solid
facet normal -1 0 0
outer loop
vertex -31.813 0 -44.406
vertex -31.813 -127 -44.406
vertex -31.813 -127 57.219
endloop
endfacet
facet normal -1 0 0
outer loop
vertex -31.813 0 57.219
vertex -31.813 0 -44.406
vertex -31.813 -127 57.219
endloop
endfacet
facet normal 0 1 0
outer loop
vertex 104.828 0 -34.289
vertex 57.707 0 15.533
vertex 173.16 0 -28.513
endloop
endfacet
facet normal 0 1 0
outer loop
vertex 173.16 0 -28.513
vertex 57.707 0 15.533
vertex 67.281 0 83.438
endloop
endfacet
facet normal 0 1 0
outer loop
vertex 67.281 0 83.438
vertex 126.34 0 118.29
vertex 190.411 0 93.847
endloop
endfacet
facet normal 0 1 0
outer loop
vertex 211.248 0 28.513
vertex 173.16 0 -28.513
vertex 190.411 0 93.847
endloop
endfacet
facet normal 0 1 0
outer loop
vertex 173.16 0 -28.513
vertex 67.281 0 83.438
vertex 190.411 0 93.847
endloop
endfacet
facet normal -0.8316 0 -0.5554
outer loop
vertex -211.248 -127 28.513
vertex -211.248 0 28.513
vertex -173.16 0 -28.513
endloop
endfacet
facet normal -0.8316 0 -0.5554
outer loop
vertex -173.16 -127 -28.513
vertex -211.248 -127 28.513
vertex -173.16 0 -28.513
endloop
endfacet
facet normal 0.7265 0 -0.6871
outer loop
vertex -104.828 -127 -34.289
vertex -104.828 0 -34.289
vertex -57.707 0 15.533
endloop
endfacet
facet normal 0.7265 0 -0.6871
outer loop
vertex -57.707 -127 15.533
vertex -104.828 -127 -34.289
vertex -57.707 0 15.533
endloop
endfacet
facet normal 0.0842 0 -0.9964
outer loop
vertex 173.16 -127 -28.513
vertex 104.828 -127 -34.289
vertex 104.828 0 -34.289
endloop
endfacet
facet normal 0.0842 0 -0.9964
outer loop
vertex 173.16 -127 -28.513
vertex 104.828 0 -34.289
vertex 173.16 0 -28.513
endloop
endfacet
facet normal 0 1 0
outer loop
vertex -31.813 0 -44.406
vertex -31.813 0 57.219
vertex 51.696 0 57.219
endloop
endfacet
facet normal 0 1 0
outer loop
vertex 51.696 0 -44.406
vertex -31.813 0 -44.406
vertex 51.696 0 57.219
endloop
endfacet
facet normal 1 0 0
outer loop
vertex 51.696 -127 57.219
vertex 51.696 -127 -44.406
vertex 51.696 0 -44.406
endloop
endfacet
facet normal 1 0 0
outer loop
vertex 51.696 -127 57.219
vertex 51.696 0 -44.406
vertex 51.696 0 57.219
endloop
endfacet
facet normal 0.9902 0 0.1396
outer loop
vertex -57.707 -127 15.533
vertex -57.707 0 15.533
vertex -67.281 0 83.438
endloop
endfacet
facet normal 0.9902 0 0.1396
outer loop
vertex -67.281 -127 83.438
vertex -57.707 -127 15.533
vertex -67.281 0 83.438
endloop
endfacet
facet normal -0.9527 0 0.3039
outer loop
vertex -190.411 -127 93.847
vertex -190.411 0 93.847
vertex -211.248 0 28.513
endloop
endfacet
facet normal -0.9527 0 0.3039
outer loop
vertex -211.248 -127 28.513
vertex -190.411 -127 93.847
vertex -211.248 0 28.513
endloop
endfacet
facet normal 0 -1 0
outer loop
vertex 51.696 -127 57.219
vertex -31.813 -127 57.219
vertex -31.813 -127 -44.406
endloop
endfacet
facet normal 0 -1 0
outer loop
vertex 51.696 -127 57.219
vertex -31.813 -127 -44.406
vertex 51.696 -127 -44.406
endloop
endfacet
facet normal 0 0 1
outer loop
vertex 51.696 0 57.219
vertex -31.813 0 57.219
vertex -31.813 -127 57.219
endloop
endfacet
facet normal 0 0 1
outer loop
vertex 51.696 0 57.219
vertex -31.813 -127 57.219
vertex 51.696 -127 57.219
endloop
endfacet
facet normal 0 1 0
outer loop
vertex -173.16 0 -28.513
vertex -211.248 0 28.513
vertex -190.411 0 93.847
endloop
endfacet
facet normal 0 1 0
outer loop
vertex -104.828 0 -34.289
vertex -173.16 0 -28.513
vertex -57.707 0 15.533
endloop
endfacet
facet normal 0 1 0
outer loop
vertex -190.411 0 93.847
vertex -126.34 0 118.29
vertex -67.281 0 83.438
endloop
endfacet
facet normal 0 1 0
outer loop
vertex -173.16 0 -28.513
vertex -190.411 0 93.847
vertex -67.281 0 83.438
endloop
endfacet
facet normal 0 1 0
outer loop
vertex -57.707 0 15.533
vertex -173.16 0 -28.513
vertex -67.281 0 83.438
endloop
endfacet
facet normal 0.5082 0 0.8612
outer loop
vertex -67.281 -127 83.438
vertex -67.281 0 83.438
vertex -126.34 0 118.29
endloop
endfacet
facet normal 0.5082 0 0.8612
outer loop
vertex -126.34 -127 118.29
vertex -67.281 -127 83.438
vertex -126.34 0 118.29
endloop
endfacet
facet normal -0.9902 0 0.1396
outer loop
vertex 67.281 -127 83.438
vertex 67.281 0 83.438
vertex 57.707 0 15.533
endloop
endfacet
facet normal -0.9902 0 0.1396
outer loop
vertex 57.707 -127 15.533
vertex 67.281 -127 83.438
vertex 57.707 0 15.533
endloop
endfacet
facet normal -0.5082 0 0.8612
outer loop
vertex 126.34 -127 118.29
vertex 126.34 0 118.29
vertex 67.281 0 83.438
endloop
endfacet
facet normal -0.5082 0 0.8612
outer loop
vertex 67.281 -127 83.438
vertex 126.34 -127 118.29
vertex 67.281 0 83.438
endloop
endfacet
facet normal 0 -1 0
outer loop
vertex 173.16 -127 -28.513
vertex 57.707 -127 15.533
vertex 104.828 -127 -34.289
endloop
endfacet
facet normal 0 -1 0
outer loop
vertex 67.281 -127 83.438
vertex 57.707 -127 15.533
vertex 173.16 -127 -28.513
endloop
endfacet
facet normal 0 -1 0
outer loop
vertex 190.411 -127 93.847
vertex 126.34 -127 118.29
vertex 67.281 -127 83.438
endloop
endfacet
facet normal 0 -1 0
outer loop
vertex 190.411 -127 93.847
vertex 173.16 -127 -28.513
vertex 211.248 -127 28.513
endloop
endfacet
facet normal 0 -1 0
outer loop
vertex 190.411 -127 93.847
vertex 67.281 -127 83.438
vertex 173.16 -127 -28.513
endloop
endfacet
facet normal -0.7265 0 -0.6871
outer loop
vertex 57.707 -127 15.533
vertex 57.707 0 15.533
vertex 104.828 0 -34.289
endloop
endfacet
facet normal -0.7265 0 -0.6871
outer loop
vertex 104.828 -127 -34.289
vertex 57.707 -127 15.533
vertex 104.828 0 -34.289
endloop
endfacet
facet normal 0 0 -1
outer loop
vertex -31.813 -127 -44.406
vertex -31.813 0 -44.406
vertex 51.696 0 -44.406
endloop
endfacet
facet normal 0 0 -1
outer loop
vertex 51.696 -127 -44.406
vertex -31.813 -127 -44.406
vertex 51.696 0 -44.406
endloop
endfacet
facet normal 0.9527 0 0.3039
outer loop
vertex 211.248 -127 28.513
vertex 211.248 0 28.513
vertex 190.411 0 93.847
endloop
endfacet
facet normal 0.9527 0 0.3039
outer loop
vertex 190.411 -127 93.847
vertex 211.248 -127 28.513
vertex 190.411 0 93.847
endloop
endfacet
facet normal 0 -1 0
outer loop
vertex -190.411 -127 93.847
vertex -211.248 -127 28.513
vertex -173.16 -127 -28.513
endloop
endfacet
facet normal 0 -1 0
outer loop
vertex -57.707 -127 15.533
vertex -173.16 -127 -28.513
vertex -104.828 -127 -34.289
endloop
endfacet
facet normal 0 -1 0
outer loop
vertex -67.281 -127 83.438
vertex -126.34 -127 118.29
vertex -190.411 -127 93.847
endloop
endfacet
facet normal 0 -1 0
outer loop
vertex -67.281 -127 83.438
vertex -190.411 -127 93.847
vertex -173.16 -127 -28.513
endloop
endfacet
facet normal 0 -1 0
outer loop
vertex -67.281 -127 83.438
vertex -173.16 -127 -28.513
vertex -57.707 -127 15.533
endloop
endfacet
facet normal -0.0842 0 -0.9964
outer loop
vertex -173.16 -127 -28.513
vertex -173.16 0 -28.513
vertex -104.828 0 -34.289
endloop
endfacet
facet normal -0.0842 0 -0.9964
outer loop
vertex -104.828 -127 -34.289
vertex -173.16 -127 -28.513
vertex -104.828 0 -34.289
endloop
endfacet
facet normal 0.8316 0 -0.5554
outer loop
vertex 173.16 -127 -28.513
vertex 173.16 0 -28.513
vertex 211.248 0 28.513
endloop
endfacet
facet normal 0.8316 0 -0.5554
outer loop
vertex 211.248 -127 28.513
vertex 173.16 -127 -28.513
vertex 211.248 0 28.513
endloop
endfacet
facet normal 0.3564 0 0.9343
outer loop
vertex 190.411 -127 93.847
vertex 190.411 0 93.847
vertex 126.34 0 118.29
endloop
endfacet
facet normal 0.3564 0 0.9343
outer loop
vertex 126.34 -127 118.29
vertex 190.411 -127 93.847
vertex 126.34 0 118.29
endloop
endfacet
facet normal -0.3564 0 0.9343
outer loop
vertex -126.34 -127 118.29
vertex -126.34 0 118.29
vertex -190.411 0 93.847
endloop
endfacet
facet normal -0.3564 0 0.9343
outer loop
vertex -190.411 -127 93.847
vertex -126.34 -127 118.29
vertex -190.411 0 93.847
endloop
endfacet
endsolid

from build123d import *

# Parameters (mm, degrees)
F0_W     = 83.509393
F0_H     = 101.625185
F1_DEPTH = 127


with BuildPart() as f1:
    # F0 (on Front) → F1 (new body)
    with BuildSketch(Plane.XZ):
        Polygon((-211.248235, 28.512936), (-173.160061, -28.512936), (-104.82785, -34.289453), (-57.707151, 15.533221), (-67.280811, 83.437597), (-126.339669, 118.290294), (-190.4112, 93.84652), align=None)
        with Locations((9.9416, 6.406809)):
            Rectangle(F0_W, F0_H)
        Polygon((211.248235, 28.512936), (190.4112, 93.84652), (126.339669, 118.290294), (67.280811, 83.437597), (57.707151, 15.533221), (104.82785, -34.289453), (173.160061, -28.512936), align=None)
    extrude(amount=F1_DEPTH)


solid = f1.part
